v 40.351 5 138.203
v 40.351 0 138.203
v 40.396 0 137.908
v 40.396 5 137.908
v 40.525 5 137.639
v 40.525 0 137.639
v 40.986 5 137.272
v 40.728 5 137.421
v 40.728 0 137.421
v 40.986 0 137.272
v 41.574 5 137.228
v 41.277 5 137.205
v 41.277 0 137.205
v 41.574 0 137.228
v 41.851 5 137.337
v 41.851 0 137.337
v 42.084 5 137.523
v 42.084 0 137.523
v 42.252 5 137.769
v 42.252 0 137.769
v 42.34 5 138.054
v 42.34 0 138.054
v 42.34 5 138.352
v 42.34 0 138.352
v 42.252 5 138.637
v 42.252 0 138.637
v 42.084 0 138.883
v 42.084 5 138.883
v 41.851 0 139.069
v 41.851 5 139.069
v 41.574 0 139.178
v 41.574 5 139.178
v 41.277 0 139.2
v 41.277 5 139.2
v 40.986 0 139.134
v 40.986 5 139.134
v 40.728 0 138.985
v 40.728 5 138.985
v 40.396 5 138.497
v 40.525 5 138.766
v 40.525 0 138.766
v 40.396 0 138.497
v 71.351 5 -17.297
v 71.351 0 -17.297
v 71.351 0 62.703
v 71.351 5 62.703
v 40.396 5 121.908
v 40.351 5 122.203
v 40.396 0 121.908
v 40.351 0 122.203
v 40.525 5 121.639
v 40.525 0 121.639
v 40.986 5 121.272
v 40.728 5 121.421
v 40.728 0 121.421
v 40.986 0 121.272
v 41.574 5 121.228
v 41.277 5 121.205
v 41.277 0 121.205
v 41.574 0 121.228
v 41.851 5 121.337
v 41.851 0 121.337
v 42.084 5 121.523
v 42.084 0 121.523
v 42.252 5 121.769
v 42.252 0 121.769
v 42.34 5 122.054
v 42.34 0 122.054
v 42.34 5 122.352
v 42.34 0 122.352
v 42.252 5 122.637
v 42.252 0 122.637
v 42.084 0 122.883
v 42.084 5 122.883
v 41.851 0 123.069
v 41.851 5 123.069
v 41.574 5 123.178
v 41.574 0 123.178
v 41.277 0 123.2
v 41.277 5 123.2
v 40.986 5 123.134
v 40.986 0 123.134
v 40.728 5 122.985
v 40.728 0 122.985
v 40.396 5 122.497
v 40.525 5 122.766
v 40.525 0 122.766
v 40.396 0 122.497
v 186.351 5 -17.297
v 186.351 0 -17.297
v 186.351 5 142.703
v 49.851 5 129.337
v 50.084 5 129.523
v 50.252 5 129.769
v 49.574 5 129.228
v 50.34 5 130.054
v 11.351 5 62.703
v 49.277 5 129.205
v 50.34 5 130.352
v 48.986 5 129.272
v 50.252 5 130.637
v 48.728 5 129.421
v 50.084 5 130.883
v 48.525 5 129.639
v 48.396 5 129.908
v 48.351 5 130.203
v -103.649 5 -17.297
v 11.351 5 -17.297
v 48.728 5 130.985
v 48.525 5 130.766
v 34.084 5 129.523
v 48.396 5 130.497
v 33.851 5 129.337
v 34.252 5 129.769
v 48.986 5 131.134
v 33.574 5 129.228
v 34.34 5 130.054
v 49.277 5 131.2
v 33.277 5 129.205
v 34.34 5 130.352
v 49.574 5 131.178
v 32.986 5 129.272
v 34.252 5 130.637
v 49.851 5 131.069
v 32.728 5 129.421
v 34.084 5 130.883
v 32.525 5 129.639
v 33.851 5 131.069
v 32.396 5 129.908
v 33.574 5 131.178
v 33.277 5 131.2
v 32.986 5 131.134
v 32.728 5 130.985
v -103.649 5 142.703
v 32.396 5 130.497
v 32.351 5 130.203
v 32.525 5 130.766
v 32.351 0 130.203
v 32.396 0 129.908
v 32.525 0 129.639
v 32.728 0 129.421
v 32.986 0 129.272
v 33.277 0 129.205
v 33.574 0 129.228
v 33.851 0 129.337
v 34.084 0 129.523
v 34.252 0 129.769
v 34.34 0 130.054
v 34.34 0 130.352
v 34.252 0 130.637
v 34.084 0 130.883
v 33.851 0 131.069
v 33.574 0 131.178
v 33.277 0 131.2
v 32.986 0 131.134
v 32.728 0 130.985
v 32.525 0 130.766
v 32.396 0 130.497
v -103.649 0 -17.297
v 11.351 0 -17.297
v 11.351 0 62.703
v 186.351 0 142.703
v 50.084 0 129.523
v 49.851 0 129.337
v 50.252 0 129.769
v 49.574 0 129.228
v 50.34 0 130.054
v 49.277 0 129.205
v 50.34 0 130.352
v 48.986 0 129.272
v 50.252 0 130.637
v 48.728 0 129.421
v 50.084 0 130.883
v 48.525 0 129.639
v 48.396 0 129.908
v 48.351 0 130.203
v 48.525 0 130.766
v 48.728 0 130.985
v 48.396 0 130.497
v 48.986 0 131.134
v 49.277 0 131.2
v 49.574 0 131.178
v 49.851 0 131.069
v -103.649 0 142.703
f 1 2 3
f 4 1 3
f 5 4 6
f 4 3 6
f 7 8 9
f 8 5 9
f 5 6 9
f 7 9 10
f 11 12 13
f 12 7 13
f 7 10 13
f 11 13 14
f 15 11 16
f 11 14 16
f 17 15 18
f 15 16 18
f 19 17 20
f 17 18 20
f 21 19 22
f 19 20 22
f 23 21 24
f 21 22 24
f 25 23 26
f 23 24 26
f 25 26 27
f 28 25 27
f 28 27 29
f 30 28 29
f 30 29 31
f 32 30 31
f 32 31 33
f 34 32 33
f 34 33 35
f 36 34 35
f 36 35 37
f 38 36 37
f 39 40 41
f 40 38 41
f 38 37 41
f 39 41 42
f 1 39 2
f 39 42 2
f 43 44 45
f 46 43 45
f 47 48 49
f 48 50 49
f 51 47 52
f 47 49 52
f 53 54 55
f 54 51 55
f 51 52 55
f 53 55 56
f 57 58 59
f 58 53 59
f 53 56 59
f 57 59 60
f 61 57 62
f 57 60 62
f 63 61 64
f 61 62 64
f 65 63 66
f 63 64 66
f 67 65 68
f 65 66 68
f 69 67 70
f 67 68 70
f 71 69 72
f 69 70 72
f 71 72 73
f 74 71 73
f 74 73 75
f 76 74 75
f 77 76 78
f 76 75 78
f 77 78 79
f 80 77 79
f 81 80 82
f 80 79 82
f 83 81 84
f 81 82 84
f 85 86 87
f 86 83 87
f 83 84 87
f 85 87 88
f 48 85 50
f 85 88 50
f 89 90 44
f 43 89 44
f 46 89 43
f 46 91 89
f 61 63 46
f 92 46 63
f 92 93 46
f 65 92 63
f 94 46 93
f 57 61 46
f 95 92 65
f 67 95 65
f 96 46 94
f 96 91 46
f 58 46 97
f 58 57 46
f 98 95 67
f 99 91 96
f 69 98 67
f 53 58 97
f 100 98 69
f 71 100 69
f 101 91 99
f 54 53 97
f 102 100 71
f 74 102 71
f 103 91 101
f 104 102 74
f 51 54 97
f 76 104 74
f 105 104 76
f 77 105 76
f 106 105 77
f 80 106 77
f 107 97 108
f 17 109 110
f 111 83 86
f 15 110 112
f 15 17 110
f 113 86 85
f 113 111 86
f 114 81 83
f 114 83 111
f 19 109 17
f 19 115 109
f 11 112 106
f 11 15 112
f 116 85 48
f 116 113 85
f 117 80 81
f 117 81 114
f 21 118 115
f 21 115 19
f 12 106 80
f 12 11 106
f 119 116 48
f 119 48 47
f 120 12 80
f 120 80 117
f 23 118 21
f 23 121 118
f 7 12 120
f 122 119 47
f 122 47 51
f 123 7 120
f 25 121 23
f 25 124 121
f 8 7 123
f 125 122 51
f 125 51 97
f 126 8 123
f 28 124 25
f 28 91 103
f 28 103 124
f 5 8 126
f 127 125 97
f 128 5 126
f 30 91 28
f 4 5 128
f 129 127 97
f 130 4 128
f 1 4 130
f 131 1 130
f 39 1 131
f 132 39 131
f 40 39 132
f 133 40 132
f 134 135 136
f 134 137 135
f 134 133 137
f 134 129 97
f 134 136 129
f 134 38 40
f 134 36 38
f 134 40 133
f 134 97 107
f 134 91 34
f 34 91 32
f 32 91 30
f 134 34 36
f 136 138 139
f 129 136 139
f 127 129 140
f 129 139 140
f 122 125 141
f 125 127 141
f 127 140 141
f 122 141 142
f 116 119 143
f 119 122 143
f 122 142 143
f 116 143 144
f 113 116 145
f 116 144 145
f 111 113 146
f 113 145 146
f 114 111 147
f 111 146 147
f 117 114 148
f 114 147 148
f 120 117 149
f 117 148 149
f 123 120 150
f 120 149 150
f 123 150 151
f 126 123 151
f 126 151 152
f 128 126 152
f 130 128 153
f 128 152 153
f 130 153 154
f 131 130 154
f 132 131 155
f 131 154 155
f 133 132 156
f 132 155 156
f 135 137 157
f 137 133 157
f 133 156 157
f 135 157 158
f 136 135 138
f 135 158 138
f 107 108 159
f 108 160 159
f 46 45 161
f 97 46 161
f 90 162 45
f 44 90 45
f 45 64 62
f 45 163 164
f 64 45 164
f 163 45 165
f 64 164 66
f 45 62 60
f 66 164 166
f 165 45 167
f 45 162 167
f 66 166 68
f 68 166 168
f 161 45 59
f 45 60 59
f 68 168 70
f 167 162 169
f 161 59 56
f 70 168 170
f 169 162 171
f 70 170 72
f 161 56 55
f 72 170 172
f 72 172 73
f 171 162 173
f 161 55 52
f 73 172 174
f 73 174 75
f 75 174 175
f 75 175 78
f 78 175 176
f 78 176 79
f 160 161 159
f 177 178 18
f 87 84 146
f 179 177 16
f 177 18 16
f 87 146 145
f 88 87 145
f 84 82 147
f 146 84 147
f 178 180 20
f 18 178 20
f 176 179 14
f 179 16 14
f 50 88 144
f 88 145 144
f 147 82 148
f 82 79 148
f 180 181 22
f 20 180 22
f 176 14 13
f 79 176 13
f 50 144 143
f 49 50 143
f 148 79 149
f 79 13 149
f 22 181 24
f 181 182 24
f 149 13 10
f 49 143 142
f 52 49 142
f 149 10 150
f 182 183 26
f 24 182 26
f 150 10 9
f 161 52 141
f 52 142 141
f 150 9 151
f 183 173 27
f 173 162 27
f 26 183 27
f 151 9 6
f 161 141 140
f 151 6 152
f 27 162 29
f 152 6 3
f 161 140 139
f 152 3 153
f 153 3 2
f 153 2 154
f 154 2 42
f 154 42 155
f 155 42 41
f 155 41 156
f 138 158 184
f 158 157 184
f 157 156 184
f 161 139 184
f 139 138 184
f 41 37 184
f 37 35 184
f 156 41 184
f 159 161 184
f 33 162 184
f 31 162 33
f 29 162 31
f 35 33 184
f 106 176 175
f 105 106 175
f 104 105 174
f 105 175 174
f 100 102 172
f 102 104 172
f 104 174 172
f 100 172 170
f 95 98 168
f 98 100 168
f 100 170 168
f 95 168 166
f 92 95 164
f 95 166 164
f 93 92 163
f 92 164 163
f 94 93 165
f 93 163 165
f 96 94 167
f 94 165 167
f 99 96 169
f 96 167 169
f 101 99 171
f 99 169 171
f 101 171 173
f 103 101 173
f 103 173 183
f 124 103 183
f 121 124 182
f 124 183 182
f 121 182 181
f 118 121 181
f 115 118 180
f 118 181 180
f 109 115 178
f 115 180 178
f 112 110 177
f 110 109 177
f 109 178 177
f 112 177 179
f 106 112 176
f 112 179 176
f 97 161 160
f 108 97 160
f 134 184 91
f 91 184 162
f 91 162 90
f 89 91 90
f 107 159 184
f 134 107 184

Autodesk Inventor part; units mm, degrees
ref_plane "YZ Plane" through (0, 0, 0) normal (1, 0, 0) x (0, 1, 0)
ref_plane "XZ Plane" through (0, 0, 0) normal (0, 1, 0) x (-1, 0, 0)
ref_plane "XY Plane" through (0, 0, 0) normal (0, 0, 1) x (1, 0, 0)
sketch "Sketch1" plane through (0, 0, 0) normal (0, 1, 0) x (-1, 0, 0)
  line L0 (103.6486, 142.7027) -> (-186.3514, 142.7027)
  line L1 (-186.3514, 142.7027) -> (-186.3514, -17.2973)
  line L2 (103.6486, -17.2973) -> (103.6486, 142.7027)
  circle A0 centre (-41.3514, 138.2027) radius 1
  circle A1 centre (-41.3514, 122.2027) radius 1
  circle A2 centre (-33.3514, 130.2027) radius 1
  circle A3 centre (-49.3514, 130.2027) radius 1
  line L3 (-186.3514, -17.2973) -> (-71.3514, -17.2973)
  line L4 (-71.3514, -17.2973) -> (-71.3514, 62.7027)
  line L5 (-71.3514, 62.7027) -> (-11.3514, 62.7027)
  line L6 (-11.3514, 62.7027) -> (-11.3514, -17.2973)
  line L7 (-11.3514, -17.2973) -> (103.6486, -17.2973)
  point P0 (0, 0)
  dimension "d0" = 290
  dimension "d1" = 160
  dimension "d2" = 4.5
  dimension "d3" = 2
  dimension "d5" = 2
  dimension "d6" = 16
  dimension "d8" = 2
  dimension "d9" = 2
  dimension "d10" = 8
  dimension "d11" = 8
  dimension "d12" = 8
  dimension "d13" = 8
  dimension "d16" = 145
  dimension "d17" = 145
  dimension "d18" = 60
  dimension "d19" = 115
  dimension "d20" = 80
extrude "Extrusion1" add sketch "Sketch1" along normal blind 5
properties part number "etage_support_minerai"
